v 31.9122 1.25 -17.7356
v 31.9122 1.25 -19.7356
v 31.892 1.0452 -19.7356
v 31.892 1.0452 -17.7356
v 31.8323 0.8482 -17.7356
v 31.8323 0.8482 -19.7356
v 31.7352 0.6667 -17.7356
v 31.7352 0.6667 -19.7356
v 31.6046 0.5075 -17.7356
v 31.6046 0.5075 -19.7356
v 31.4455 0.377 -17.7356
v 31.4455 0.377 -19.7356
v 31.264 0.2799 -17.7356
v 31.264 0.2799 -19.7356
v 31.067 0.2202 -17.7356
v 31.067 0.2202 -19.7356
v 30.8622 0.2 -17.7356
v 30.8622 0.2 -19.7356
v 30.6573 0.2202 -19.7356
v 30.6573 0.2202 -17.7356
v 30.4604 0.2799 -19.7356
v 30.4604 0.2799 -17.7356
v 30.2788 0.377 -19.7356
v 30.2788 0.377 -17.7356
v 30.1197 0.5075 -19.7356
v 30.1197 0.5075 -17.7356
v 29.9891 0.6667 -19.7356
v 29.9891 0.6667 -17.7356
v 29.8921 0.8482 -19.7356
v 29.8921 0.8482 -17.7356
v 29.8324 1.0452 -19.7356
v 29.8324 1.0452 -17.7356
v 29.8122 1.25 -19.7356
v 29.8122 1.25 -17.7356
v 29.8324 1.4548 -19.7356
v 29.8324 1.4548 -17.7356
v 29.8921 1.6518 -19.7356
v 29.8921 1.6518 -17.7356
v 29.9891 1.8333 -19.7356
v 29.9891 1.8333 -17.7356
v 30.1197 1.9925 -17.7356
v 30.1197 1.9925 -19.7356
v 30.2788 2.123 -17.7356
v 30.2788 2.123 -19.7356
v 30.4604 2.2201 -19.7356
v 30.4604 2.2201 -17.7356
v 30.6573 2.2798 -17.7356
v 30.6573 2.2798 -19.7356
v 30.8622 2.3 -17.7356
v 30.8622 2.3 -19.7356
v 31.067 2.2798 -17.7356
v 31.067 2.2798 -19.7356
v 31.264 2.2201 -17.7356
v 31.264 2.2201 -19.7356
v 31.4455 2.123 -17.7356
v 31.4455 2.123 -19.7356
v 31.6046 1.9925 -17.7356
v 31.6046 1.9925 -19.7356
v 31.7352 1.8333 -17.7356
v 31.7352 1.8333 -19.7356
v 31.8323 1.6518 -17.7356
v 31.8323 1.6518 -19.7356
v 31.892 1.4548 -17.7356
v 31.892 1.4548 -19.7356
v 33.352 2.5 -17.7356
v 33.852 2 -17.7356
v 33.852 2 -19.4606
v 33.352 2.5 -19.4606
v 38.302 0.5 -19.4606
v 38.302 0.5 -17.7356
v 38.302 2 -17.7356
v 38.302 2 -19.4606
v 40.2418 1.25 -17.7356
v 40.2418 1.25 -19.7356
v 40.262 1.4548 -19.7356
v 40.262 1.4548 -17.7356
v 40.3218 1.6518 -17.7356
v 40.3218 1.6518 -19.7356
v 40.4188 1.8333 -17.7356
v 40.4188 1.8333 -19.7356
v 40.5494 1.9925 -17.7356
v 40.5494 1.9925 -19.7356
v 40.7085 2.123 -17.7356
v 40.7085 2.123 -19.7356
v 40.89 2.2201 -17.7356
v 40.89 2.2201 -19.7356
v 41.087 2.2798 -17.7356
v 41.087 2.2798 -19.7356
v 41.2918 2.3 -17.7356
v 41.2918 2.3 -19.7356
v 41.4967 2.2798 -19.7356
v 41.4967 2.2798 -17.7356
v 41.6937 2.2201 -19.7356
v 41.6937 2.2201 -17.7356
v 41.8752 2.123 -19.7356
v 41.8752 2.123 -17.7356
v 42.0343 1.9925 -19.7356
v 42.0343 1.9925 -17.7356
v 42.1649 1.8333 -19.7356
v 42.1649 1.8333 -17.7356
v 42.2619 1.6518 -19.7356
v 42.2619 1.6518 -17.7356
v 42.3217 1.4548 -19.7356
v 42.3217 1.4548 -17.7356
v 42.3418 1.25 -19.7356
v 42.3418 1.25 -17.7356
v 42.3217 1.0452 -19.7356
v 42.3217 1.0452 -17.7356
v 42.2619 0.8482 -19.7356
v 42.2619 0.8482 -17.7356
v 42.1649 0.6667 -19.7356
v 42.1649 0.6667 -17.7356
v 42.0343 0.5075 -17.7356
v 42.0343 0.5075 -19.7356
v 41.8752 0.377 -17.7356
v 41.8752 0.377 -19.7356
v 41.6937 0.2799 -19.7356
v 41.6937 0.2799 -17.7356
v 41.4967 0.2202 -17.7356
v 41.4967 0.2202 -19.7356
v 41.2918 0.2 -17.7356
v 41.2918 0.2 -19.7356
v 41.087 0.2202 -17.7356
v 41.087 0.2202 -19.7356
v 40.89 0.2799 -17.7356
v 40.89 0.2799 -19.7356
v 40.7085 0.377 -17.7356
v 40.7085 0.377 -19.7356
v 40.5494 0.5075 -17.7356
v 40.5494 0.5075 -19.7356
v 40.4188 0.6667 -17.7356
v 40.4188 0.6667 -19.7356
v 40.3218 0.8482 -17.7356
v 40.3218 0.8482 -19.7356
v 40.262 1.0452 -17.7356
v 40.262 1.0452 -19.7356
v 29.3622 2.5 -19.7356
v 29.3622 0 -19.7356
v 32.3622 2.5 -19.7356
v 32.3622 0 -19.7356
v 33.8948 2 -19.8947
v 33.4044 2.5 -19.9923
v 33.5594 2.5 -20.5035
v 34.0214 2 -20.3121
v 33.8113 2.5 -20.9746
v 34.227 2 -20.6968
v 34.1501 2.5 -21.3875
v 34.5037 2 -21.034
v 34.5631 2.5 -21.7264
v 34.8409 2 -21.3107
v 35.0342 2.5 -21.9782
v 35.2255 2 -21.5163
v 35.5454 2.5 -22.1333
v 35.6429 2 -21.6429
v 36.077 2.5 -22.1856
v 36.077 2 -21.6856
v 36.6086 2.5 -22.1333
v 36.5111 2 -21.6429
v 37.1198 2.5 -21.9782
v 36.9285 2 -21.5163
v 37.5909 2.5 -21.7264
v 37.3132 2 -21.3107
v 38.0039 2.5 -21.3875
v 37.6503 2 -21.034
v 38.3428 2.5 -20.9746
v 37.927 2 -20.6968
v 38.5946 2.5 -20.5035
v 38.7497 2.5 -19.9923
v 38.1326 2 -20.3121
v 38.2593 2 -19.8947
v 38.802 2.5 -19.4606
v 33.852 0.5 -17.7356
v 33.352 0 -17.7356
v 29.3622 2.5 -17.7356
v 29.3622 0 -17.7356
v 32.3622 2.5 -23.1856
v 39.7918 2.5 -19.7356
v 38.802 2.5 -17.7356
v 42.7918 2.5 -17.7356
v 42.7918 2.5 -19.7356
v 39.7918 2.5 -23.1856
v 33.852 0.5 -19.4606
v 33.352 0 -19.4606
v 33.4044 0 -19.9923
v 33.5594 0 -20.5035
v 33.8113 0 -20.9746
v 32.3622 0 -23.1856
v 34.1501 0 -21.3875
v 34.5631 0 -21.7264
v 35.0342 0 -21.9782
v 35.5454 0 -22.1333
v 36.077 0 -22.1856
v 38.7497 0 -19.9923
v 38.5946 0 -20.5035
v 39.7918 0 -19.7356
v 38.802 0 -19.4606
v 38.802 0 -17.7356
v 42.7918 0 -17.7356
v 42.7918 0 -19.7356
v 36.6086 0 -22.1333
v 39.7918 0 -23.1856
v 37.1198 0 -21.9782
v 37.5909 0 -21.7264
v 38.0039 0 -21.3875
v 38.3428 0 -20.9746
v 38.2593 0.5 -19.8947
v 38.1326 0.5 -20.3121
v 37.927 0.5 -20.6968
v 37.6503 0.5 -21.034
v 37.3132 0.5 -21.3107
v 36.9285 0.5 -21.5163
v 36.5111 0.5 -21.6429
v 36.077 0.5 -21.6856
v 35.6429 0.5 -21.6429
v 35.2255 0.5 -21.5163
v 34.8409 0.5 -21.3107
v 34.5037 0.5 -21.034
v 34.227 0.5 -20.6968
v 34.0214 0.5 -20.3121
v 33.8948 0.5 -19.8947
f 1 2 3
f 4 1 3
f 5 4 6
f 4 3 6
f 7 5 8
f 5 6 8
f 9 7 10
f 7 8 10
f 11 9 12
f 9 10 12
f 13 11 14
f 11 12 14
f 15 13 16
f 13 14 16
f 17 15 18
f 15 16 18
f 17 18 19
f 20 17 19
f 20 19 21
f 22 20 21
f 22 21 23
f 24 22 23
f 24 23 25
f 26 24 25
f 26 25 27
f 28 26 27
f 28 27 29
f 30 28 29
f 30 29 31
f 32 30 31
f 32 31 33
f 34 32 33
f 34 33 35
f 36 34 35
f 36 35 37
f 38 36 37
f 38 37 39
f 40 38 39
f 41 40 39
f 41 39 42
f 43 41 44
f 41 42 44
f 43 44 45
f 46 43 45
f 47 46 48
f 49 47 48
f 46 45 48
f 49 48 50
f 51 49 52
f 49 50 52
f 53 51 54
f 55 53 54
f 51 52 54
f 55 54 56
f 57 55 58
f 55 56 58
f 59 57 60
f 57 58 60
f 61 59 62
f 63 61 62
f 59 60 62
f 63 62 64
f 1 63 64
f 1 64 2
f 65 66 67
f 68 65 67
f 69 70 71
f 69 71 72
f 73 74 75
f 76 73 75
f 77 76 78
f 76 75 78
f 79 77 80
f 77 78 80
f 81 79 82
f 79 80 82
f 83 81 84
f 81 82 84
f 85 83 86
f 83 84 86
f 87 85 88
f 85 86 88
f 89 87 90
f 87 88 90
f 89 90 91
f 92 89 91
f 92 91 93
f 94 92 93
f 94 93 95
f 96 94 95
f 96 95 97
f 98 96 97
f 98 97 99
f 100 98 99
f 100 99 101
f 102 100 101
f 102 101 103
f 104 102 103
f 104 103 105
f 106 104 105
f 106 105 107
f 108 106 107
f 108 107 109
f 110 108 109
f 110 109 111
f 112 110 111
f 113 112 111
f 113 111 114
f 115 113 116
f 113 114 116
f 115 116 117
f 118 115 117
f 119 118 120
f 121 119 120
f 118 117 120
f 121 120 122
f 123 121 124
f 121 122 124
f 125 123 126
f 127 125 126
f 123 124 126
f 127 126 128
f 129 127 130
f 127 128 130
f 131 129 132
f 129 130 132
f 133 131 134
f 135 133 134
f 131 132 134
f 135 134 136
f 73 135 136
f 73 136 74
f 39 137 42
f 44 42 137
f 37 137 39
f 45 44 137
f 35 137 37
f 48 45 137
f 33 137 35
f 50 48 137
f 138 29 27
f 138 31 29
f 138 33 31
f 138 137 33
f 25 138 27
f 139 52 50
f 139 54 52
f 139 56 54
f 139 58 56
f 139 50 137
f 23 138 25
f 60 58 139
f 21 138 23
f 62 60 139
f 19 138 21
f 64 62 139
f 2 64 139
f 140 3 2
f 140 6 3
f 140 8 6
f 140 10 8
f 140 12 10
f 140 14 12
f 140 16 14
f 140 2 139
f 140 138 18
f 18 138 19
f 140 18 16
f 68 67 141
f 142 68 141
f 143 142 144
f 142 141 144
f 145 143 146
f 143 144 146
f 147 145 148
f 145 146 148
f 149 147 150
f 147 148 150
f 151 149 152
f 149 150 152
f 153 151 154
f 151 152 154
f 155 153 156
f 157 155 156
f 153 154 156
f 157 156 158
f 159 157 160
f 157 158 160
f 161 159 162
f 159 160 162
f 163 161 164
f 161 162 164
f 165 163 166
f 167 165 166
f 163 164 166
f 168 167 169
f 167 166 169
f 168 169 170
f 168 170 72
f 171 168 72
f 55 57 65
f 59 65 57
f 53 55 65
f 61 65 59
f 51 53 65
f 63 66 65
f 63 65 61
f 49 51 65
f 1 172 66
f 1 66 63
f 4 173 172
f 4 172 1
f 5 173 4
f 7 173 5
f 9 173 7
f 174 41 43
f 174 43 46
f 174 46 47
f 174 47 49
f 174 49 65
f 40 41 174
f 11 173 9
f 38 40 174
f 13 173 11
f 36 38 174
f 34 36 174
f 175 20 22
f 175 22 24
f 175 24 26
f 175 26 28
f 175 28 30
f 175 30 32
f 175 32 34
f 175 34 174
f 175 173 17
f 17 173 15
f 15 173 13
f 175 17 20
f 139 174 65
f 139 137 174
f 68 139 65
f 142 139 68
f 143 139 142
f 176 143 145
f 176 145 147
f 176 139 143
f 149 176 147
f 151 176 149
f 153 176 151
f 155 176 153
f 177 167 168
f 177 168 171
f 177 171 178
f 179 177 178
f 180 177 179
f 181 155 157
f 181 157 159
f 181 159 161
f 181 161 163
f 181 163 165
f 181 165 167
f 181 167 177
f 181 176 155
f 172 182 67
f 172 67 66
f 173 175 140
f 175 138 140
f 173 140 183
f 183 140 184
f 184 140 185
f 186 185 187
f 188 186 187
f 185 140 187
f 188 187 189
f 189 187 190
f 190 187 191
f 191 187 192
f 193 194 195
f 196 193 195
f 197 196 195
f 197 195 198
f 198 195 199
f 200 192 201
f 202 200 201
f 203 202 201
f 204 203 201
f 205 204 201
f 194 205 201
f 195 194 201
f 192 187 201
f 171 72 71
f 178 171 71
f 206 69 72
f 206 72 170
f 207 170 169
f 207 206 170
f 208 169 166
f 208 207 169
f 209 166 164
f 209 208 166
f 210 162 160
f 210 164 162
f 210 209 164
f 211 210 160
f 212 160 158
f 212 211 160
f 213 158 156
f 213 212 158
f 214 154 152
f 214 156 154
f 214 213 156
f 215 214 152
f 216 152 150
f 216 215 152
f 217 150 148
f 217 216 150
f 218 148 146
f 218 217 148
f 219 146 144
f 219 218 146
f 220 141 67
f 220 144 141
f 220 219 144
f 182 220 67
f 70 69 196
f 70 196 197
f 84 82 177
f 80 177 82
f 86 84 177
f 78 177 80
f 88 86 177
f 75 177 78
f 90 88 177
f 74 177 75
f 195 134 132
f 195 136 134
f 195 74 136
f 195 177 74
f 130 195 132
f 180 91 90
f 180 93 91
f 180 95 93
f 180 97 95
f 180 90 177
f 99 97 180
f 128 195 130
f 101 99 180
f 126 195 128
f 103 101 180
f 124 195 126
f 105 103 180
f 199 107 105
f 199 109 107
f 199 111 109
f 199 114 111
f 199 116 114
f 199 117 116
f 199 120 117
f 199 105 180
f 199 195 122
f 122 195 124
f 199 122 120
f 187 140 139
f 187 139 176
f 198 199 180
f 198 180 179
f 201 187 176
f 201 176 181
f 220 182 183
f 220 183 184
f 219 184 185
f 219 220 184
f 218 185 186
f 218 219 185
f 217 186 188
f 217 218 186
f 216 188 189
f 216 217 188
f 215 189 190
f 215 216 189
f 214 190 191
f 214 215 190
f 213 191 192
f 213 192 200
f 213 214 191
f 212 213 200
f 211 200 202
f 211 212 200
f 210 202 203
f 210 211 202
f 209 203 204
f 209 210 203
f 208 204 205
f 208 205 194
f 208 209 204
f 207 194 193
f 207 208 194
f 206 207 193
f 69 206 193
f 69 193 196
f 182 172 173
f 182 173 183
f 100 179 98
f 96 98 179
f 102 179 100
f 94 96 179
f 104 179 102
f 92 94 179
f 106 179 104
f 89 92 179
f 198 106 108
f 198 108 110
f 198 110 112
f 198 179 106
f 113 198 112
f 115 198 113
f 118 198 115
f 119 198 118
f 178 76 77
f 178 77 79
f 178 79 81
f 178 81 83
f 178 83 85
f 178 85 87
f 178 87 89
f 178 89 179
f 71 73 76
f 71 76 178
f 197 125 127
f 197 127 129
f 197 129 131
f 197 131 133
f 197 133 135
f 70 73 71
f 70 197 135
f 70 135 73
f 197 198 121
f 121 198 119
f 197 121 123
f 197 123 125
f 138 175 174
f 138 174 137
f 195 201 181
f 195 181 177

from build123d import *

# Parameters (mm, degrees)
SKETCH1_W               = 72.154028999
SKETCH1_H               = 39.439030188
BOSS_EXTRUDE1_DEPTH     = 2.5
CUT_EXTRUDE1_DEPTH      = 83.26719275
CUT_EXTRUDE1_DEPTH_BACK = 15
SKETCH2_W               = 72.154028999
SKETCH2_H               = 39.439030188
CHAMFER1_SIZE           = 0.5
CHAMFER2_SIZE           = 0.5
CUT_EXTRUDE2_DEPTH      = 10


with BuildPart() as part:
    # Sketch1 → Boss-Extrude1 (new body)
    with BuildSketch(Plane(origin=(0, 0, 0), x_dir=(1, 0, 0), z_dir=(0, 1, 0))):
        with Locations((36.0770145, 19.719515094)):
            Rectangle(SKETCH1_W, SKETCH1_H)
    extrude(amount=BOSS_EXTRUDE1_DEPTH)

    # Sketch2 → Cut-Extrude1 (cut, two sides: drawn at the far end of the back side and taken through both)
    with BuildSketch(Plane(origin=(0, 2.5, 0), x_dir=(1, 0, 0), z_dir=(0, 1, 0)).offset(-CUT_EXTRUDE1_DEPTH_BACK)):
        with Locations((36.0770145, 19.719515094)):
            Rectangle(SKETCH2_W, SKETCH2_H)
        with BuildLine():
            Line((38.3020145, 17.735642877), (38.3020145, 19.460642877))
            ThreePointArc((38.3020145, 19.460642877), (36.0770145, 21.685642877), (33.8520145, 19.460642877))
            Line((33.8520145, 19.460642877), (33.8520145, 17.735642877))
            Line((33.8520145, 17.735642877), (29.362179375, 17.735642877))
            Line((29.362179375, 17.735642877), (29.362179375, 19.735642877))
            Line((29.362179375, 19.735642877), (32.362179375, 19.735642877))
            Line((32.362179375, 19.735642877), (32.362179375, 23.185642877))
            Line((32.362179375, 23.185642877), (39.791849624, 23.185642877))
            Line((39.791849624, 23.185642877), (39.791849624, 19.735642877))
            Line((39.791849624, 19.735642877), (42.791849624, 19.735642877))
            Line((42.791849624, 19.735642877), (42.791849624, 17.735642877))
            Line((42.791849624, 17.735642877), (38.3020145, 17.735642877))
        make_face(mode=Mode.SUBTRACT)
    extrude(amount=CUT_EXTRUDE1_DEPTH + CUT_EXTRUDE1_DEPTH_BACK, mode=Mode.SUBTRACT)

    # Chamfer1
    chamfer1_edges = [part.edges().sort_by_distance(p)[0] for p in [
        (36.0770145, 0, -21.685642877),
        (33.8520145, 0, -18.598142877),
        (38.3020145, 0, -18.598142877),
    ]]
    chamfer(chamfer1_edges, length=CHAMFER1_SIZE)

    # Chamfer2
    chamfer2_edges = [part.edges().sort_by_distance(p)[0] for p in [
        (38.3020145, 2.5, -18.598142877),
        (33.8520145, 2.5, -18.598142877),
        (36.0770145, 2.5, -21.685642877),
    ]]
    chamfer(chamfer2_edges, length=CHAMFER2_SIZE)

    # Sketch4 → Cut-Extrude2 (cut)
    with BuildSketch(Plane(origin=(0, 0, -19.735642877), x_dir=(-1, 0, 0), z_dir=(0, 0, -1))):
        with BuildLine():
            ThreePointArc((-42.341849624, 1.25), (-41.291849624, 0.2), (-40.241849624, 1.25))
            Line((-40.241849624, 1.25), (-42.341849624, 1.25))
        make_face()
        with BuildLine():
            Line((-42.341849624, 1.25), (-40.241849624, 1.25))
            ThreePointArc((-40.241849624, 1.25), (-41.291849624, 2.3), (-42.341849624, 1.25))
        make_face()
        with BuildLine():
            ThreePointArc((-29.812179375, 1.25), (-30.862179375, 2.3), (-31.912179375, 1.25))
            Line((-31.912179375, 1.25), (-29.812179375, 1.25))
        make_face()
        with BuildLine():
            Line((-29.812179375, 1.25), (-31.912179375, 1.25))
            ThreePointArc((-31.912179375, 1.25), (-30.862179375, 0.2), (-29.812179375, 1.25))
        make_face()
    extrude(amount=-CUT_EXTRUDE2_DEPTH, mode=Mode.SUBTRACT)


solid = part.part
